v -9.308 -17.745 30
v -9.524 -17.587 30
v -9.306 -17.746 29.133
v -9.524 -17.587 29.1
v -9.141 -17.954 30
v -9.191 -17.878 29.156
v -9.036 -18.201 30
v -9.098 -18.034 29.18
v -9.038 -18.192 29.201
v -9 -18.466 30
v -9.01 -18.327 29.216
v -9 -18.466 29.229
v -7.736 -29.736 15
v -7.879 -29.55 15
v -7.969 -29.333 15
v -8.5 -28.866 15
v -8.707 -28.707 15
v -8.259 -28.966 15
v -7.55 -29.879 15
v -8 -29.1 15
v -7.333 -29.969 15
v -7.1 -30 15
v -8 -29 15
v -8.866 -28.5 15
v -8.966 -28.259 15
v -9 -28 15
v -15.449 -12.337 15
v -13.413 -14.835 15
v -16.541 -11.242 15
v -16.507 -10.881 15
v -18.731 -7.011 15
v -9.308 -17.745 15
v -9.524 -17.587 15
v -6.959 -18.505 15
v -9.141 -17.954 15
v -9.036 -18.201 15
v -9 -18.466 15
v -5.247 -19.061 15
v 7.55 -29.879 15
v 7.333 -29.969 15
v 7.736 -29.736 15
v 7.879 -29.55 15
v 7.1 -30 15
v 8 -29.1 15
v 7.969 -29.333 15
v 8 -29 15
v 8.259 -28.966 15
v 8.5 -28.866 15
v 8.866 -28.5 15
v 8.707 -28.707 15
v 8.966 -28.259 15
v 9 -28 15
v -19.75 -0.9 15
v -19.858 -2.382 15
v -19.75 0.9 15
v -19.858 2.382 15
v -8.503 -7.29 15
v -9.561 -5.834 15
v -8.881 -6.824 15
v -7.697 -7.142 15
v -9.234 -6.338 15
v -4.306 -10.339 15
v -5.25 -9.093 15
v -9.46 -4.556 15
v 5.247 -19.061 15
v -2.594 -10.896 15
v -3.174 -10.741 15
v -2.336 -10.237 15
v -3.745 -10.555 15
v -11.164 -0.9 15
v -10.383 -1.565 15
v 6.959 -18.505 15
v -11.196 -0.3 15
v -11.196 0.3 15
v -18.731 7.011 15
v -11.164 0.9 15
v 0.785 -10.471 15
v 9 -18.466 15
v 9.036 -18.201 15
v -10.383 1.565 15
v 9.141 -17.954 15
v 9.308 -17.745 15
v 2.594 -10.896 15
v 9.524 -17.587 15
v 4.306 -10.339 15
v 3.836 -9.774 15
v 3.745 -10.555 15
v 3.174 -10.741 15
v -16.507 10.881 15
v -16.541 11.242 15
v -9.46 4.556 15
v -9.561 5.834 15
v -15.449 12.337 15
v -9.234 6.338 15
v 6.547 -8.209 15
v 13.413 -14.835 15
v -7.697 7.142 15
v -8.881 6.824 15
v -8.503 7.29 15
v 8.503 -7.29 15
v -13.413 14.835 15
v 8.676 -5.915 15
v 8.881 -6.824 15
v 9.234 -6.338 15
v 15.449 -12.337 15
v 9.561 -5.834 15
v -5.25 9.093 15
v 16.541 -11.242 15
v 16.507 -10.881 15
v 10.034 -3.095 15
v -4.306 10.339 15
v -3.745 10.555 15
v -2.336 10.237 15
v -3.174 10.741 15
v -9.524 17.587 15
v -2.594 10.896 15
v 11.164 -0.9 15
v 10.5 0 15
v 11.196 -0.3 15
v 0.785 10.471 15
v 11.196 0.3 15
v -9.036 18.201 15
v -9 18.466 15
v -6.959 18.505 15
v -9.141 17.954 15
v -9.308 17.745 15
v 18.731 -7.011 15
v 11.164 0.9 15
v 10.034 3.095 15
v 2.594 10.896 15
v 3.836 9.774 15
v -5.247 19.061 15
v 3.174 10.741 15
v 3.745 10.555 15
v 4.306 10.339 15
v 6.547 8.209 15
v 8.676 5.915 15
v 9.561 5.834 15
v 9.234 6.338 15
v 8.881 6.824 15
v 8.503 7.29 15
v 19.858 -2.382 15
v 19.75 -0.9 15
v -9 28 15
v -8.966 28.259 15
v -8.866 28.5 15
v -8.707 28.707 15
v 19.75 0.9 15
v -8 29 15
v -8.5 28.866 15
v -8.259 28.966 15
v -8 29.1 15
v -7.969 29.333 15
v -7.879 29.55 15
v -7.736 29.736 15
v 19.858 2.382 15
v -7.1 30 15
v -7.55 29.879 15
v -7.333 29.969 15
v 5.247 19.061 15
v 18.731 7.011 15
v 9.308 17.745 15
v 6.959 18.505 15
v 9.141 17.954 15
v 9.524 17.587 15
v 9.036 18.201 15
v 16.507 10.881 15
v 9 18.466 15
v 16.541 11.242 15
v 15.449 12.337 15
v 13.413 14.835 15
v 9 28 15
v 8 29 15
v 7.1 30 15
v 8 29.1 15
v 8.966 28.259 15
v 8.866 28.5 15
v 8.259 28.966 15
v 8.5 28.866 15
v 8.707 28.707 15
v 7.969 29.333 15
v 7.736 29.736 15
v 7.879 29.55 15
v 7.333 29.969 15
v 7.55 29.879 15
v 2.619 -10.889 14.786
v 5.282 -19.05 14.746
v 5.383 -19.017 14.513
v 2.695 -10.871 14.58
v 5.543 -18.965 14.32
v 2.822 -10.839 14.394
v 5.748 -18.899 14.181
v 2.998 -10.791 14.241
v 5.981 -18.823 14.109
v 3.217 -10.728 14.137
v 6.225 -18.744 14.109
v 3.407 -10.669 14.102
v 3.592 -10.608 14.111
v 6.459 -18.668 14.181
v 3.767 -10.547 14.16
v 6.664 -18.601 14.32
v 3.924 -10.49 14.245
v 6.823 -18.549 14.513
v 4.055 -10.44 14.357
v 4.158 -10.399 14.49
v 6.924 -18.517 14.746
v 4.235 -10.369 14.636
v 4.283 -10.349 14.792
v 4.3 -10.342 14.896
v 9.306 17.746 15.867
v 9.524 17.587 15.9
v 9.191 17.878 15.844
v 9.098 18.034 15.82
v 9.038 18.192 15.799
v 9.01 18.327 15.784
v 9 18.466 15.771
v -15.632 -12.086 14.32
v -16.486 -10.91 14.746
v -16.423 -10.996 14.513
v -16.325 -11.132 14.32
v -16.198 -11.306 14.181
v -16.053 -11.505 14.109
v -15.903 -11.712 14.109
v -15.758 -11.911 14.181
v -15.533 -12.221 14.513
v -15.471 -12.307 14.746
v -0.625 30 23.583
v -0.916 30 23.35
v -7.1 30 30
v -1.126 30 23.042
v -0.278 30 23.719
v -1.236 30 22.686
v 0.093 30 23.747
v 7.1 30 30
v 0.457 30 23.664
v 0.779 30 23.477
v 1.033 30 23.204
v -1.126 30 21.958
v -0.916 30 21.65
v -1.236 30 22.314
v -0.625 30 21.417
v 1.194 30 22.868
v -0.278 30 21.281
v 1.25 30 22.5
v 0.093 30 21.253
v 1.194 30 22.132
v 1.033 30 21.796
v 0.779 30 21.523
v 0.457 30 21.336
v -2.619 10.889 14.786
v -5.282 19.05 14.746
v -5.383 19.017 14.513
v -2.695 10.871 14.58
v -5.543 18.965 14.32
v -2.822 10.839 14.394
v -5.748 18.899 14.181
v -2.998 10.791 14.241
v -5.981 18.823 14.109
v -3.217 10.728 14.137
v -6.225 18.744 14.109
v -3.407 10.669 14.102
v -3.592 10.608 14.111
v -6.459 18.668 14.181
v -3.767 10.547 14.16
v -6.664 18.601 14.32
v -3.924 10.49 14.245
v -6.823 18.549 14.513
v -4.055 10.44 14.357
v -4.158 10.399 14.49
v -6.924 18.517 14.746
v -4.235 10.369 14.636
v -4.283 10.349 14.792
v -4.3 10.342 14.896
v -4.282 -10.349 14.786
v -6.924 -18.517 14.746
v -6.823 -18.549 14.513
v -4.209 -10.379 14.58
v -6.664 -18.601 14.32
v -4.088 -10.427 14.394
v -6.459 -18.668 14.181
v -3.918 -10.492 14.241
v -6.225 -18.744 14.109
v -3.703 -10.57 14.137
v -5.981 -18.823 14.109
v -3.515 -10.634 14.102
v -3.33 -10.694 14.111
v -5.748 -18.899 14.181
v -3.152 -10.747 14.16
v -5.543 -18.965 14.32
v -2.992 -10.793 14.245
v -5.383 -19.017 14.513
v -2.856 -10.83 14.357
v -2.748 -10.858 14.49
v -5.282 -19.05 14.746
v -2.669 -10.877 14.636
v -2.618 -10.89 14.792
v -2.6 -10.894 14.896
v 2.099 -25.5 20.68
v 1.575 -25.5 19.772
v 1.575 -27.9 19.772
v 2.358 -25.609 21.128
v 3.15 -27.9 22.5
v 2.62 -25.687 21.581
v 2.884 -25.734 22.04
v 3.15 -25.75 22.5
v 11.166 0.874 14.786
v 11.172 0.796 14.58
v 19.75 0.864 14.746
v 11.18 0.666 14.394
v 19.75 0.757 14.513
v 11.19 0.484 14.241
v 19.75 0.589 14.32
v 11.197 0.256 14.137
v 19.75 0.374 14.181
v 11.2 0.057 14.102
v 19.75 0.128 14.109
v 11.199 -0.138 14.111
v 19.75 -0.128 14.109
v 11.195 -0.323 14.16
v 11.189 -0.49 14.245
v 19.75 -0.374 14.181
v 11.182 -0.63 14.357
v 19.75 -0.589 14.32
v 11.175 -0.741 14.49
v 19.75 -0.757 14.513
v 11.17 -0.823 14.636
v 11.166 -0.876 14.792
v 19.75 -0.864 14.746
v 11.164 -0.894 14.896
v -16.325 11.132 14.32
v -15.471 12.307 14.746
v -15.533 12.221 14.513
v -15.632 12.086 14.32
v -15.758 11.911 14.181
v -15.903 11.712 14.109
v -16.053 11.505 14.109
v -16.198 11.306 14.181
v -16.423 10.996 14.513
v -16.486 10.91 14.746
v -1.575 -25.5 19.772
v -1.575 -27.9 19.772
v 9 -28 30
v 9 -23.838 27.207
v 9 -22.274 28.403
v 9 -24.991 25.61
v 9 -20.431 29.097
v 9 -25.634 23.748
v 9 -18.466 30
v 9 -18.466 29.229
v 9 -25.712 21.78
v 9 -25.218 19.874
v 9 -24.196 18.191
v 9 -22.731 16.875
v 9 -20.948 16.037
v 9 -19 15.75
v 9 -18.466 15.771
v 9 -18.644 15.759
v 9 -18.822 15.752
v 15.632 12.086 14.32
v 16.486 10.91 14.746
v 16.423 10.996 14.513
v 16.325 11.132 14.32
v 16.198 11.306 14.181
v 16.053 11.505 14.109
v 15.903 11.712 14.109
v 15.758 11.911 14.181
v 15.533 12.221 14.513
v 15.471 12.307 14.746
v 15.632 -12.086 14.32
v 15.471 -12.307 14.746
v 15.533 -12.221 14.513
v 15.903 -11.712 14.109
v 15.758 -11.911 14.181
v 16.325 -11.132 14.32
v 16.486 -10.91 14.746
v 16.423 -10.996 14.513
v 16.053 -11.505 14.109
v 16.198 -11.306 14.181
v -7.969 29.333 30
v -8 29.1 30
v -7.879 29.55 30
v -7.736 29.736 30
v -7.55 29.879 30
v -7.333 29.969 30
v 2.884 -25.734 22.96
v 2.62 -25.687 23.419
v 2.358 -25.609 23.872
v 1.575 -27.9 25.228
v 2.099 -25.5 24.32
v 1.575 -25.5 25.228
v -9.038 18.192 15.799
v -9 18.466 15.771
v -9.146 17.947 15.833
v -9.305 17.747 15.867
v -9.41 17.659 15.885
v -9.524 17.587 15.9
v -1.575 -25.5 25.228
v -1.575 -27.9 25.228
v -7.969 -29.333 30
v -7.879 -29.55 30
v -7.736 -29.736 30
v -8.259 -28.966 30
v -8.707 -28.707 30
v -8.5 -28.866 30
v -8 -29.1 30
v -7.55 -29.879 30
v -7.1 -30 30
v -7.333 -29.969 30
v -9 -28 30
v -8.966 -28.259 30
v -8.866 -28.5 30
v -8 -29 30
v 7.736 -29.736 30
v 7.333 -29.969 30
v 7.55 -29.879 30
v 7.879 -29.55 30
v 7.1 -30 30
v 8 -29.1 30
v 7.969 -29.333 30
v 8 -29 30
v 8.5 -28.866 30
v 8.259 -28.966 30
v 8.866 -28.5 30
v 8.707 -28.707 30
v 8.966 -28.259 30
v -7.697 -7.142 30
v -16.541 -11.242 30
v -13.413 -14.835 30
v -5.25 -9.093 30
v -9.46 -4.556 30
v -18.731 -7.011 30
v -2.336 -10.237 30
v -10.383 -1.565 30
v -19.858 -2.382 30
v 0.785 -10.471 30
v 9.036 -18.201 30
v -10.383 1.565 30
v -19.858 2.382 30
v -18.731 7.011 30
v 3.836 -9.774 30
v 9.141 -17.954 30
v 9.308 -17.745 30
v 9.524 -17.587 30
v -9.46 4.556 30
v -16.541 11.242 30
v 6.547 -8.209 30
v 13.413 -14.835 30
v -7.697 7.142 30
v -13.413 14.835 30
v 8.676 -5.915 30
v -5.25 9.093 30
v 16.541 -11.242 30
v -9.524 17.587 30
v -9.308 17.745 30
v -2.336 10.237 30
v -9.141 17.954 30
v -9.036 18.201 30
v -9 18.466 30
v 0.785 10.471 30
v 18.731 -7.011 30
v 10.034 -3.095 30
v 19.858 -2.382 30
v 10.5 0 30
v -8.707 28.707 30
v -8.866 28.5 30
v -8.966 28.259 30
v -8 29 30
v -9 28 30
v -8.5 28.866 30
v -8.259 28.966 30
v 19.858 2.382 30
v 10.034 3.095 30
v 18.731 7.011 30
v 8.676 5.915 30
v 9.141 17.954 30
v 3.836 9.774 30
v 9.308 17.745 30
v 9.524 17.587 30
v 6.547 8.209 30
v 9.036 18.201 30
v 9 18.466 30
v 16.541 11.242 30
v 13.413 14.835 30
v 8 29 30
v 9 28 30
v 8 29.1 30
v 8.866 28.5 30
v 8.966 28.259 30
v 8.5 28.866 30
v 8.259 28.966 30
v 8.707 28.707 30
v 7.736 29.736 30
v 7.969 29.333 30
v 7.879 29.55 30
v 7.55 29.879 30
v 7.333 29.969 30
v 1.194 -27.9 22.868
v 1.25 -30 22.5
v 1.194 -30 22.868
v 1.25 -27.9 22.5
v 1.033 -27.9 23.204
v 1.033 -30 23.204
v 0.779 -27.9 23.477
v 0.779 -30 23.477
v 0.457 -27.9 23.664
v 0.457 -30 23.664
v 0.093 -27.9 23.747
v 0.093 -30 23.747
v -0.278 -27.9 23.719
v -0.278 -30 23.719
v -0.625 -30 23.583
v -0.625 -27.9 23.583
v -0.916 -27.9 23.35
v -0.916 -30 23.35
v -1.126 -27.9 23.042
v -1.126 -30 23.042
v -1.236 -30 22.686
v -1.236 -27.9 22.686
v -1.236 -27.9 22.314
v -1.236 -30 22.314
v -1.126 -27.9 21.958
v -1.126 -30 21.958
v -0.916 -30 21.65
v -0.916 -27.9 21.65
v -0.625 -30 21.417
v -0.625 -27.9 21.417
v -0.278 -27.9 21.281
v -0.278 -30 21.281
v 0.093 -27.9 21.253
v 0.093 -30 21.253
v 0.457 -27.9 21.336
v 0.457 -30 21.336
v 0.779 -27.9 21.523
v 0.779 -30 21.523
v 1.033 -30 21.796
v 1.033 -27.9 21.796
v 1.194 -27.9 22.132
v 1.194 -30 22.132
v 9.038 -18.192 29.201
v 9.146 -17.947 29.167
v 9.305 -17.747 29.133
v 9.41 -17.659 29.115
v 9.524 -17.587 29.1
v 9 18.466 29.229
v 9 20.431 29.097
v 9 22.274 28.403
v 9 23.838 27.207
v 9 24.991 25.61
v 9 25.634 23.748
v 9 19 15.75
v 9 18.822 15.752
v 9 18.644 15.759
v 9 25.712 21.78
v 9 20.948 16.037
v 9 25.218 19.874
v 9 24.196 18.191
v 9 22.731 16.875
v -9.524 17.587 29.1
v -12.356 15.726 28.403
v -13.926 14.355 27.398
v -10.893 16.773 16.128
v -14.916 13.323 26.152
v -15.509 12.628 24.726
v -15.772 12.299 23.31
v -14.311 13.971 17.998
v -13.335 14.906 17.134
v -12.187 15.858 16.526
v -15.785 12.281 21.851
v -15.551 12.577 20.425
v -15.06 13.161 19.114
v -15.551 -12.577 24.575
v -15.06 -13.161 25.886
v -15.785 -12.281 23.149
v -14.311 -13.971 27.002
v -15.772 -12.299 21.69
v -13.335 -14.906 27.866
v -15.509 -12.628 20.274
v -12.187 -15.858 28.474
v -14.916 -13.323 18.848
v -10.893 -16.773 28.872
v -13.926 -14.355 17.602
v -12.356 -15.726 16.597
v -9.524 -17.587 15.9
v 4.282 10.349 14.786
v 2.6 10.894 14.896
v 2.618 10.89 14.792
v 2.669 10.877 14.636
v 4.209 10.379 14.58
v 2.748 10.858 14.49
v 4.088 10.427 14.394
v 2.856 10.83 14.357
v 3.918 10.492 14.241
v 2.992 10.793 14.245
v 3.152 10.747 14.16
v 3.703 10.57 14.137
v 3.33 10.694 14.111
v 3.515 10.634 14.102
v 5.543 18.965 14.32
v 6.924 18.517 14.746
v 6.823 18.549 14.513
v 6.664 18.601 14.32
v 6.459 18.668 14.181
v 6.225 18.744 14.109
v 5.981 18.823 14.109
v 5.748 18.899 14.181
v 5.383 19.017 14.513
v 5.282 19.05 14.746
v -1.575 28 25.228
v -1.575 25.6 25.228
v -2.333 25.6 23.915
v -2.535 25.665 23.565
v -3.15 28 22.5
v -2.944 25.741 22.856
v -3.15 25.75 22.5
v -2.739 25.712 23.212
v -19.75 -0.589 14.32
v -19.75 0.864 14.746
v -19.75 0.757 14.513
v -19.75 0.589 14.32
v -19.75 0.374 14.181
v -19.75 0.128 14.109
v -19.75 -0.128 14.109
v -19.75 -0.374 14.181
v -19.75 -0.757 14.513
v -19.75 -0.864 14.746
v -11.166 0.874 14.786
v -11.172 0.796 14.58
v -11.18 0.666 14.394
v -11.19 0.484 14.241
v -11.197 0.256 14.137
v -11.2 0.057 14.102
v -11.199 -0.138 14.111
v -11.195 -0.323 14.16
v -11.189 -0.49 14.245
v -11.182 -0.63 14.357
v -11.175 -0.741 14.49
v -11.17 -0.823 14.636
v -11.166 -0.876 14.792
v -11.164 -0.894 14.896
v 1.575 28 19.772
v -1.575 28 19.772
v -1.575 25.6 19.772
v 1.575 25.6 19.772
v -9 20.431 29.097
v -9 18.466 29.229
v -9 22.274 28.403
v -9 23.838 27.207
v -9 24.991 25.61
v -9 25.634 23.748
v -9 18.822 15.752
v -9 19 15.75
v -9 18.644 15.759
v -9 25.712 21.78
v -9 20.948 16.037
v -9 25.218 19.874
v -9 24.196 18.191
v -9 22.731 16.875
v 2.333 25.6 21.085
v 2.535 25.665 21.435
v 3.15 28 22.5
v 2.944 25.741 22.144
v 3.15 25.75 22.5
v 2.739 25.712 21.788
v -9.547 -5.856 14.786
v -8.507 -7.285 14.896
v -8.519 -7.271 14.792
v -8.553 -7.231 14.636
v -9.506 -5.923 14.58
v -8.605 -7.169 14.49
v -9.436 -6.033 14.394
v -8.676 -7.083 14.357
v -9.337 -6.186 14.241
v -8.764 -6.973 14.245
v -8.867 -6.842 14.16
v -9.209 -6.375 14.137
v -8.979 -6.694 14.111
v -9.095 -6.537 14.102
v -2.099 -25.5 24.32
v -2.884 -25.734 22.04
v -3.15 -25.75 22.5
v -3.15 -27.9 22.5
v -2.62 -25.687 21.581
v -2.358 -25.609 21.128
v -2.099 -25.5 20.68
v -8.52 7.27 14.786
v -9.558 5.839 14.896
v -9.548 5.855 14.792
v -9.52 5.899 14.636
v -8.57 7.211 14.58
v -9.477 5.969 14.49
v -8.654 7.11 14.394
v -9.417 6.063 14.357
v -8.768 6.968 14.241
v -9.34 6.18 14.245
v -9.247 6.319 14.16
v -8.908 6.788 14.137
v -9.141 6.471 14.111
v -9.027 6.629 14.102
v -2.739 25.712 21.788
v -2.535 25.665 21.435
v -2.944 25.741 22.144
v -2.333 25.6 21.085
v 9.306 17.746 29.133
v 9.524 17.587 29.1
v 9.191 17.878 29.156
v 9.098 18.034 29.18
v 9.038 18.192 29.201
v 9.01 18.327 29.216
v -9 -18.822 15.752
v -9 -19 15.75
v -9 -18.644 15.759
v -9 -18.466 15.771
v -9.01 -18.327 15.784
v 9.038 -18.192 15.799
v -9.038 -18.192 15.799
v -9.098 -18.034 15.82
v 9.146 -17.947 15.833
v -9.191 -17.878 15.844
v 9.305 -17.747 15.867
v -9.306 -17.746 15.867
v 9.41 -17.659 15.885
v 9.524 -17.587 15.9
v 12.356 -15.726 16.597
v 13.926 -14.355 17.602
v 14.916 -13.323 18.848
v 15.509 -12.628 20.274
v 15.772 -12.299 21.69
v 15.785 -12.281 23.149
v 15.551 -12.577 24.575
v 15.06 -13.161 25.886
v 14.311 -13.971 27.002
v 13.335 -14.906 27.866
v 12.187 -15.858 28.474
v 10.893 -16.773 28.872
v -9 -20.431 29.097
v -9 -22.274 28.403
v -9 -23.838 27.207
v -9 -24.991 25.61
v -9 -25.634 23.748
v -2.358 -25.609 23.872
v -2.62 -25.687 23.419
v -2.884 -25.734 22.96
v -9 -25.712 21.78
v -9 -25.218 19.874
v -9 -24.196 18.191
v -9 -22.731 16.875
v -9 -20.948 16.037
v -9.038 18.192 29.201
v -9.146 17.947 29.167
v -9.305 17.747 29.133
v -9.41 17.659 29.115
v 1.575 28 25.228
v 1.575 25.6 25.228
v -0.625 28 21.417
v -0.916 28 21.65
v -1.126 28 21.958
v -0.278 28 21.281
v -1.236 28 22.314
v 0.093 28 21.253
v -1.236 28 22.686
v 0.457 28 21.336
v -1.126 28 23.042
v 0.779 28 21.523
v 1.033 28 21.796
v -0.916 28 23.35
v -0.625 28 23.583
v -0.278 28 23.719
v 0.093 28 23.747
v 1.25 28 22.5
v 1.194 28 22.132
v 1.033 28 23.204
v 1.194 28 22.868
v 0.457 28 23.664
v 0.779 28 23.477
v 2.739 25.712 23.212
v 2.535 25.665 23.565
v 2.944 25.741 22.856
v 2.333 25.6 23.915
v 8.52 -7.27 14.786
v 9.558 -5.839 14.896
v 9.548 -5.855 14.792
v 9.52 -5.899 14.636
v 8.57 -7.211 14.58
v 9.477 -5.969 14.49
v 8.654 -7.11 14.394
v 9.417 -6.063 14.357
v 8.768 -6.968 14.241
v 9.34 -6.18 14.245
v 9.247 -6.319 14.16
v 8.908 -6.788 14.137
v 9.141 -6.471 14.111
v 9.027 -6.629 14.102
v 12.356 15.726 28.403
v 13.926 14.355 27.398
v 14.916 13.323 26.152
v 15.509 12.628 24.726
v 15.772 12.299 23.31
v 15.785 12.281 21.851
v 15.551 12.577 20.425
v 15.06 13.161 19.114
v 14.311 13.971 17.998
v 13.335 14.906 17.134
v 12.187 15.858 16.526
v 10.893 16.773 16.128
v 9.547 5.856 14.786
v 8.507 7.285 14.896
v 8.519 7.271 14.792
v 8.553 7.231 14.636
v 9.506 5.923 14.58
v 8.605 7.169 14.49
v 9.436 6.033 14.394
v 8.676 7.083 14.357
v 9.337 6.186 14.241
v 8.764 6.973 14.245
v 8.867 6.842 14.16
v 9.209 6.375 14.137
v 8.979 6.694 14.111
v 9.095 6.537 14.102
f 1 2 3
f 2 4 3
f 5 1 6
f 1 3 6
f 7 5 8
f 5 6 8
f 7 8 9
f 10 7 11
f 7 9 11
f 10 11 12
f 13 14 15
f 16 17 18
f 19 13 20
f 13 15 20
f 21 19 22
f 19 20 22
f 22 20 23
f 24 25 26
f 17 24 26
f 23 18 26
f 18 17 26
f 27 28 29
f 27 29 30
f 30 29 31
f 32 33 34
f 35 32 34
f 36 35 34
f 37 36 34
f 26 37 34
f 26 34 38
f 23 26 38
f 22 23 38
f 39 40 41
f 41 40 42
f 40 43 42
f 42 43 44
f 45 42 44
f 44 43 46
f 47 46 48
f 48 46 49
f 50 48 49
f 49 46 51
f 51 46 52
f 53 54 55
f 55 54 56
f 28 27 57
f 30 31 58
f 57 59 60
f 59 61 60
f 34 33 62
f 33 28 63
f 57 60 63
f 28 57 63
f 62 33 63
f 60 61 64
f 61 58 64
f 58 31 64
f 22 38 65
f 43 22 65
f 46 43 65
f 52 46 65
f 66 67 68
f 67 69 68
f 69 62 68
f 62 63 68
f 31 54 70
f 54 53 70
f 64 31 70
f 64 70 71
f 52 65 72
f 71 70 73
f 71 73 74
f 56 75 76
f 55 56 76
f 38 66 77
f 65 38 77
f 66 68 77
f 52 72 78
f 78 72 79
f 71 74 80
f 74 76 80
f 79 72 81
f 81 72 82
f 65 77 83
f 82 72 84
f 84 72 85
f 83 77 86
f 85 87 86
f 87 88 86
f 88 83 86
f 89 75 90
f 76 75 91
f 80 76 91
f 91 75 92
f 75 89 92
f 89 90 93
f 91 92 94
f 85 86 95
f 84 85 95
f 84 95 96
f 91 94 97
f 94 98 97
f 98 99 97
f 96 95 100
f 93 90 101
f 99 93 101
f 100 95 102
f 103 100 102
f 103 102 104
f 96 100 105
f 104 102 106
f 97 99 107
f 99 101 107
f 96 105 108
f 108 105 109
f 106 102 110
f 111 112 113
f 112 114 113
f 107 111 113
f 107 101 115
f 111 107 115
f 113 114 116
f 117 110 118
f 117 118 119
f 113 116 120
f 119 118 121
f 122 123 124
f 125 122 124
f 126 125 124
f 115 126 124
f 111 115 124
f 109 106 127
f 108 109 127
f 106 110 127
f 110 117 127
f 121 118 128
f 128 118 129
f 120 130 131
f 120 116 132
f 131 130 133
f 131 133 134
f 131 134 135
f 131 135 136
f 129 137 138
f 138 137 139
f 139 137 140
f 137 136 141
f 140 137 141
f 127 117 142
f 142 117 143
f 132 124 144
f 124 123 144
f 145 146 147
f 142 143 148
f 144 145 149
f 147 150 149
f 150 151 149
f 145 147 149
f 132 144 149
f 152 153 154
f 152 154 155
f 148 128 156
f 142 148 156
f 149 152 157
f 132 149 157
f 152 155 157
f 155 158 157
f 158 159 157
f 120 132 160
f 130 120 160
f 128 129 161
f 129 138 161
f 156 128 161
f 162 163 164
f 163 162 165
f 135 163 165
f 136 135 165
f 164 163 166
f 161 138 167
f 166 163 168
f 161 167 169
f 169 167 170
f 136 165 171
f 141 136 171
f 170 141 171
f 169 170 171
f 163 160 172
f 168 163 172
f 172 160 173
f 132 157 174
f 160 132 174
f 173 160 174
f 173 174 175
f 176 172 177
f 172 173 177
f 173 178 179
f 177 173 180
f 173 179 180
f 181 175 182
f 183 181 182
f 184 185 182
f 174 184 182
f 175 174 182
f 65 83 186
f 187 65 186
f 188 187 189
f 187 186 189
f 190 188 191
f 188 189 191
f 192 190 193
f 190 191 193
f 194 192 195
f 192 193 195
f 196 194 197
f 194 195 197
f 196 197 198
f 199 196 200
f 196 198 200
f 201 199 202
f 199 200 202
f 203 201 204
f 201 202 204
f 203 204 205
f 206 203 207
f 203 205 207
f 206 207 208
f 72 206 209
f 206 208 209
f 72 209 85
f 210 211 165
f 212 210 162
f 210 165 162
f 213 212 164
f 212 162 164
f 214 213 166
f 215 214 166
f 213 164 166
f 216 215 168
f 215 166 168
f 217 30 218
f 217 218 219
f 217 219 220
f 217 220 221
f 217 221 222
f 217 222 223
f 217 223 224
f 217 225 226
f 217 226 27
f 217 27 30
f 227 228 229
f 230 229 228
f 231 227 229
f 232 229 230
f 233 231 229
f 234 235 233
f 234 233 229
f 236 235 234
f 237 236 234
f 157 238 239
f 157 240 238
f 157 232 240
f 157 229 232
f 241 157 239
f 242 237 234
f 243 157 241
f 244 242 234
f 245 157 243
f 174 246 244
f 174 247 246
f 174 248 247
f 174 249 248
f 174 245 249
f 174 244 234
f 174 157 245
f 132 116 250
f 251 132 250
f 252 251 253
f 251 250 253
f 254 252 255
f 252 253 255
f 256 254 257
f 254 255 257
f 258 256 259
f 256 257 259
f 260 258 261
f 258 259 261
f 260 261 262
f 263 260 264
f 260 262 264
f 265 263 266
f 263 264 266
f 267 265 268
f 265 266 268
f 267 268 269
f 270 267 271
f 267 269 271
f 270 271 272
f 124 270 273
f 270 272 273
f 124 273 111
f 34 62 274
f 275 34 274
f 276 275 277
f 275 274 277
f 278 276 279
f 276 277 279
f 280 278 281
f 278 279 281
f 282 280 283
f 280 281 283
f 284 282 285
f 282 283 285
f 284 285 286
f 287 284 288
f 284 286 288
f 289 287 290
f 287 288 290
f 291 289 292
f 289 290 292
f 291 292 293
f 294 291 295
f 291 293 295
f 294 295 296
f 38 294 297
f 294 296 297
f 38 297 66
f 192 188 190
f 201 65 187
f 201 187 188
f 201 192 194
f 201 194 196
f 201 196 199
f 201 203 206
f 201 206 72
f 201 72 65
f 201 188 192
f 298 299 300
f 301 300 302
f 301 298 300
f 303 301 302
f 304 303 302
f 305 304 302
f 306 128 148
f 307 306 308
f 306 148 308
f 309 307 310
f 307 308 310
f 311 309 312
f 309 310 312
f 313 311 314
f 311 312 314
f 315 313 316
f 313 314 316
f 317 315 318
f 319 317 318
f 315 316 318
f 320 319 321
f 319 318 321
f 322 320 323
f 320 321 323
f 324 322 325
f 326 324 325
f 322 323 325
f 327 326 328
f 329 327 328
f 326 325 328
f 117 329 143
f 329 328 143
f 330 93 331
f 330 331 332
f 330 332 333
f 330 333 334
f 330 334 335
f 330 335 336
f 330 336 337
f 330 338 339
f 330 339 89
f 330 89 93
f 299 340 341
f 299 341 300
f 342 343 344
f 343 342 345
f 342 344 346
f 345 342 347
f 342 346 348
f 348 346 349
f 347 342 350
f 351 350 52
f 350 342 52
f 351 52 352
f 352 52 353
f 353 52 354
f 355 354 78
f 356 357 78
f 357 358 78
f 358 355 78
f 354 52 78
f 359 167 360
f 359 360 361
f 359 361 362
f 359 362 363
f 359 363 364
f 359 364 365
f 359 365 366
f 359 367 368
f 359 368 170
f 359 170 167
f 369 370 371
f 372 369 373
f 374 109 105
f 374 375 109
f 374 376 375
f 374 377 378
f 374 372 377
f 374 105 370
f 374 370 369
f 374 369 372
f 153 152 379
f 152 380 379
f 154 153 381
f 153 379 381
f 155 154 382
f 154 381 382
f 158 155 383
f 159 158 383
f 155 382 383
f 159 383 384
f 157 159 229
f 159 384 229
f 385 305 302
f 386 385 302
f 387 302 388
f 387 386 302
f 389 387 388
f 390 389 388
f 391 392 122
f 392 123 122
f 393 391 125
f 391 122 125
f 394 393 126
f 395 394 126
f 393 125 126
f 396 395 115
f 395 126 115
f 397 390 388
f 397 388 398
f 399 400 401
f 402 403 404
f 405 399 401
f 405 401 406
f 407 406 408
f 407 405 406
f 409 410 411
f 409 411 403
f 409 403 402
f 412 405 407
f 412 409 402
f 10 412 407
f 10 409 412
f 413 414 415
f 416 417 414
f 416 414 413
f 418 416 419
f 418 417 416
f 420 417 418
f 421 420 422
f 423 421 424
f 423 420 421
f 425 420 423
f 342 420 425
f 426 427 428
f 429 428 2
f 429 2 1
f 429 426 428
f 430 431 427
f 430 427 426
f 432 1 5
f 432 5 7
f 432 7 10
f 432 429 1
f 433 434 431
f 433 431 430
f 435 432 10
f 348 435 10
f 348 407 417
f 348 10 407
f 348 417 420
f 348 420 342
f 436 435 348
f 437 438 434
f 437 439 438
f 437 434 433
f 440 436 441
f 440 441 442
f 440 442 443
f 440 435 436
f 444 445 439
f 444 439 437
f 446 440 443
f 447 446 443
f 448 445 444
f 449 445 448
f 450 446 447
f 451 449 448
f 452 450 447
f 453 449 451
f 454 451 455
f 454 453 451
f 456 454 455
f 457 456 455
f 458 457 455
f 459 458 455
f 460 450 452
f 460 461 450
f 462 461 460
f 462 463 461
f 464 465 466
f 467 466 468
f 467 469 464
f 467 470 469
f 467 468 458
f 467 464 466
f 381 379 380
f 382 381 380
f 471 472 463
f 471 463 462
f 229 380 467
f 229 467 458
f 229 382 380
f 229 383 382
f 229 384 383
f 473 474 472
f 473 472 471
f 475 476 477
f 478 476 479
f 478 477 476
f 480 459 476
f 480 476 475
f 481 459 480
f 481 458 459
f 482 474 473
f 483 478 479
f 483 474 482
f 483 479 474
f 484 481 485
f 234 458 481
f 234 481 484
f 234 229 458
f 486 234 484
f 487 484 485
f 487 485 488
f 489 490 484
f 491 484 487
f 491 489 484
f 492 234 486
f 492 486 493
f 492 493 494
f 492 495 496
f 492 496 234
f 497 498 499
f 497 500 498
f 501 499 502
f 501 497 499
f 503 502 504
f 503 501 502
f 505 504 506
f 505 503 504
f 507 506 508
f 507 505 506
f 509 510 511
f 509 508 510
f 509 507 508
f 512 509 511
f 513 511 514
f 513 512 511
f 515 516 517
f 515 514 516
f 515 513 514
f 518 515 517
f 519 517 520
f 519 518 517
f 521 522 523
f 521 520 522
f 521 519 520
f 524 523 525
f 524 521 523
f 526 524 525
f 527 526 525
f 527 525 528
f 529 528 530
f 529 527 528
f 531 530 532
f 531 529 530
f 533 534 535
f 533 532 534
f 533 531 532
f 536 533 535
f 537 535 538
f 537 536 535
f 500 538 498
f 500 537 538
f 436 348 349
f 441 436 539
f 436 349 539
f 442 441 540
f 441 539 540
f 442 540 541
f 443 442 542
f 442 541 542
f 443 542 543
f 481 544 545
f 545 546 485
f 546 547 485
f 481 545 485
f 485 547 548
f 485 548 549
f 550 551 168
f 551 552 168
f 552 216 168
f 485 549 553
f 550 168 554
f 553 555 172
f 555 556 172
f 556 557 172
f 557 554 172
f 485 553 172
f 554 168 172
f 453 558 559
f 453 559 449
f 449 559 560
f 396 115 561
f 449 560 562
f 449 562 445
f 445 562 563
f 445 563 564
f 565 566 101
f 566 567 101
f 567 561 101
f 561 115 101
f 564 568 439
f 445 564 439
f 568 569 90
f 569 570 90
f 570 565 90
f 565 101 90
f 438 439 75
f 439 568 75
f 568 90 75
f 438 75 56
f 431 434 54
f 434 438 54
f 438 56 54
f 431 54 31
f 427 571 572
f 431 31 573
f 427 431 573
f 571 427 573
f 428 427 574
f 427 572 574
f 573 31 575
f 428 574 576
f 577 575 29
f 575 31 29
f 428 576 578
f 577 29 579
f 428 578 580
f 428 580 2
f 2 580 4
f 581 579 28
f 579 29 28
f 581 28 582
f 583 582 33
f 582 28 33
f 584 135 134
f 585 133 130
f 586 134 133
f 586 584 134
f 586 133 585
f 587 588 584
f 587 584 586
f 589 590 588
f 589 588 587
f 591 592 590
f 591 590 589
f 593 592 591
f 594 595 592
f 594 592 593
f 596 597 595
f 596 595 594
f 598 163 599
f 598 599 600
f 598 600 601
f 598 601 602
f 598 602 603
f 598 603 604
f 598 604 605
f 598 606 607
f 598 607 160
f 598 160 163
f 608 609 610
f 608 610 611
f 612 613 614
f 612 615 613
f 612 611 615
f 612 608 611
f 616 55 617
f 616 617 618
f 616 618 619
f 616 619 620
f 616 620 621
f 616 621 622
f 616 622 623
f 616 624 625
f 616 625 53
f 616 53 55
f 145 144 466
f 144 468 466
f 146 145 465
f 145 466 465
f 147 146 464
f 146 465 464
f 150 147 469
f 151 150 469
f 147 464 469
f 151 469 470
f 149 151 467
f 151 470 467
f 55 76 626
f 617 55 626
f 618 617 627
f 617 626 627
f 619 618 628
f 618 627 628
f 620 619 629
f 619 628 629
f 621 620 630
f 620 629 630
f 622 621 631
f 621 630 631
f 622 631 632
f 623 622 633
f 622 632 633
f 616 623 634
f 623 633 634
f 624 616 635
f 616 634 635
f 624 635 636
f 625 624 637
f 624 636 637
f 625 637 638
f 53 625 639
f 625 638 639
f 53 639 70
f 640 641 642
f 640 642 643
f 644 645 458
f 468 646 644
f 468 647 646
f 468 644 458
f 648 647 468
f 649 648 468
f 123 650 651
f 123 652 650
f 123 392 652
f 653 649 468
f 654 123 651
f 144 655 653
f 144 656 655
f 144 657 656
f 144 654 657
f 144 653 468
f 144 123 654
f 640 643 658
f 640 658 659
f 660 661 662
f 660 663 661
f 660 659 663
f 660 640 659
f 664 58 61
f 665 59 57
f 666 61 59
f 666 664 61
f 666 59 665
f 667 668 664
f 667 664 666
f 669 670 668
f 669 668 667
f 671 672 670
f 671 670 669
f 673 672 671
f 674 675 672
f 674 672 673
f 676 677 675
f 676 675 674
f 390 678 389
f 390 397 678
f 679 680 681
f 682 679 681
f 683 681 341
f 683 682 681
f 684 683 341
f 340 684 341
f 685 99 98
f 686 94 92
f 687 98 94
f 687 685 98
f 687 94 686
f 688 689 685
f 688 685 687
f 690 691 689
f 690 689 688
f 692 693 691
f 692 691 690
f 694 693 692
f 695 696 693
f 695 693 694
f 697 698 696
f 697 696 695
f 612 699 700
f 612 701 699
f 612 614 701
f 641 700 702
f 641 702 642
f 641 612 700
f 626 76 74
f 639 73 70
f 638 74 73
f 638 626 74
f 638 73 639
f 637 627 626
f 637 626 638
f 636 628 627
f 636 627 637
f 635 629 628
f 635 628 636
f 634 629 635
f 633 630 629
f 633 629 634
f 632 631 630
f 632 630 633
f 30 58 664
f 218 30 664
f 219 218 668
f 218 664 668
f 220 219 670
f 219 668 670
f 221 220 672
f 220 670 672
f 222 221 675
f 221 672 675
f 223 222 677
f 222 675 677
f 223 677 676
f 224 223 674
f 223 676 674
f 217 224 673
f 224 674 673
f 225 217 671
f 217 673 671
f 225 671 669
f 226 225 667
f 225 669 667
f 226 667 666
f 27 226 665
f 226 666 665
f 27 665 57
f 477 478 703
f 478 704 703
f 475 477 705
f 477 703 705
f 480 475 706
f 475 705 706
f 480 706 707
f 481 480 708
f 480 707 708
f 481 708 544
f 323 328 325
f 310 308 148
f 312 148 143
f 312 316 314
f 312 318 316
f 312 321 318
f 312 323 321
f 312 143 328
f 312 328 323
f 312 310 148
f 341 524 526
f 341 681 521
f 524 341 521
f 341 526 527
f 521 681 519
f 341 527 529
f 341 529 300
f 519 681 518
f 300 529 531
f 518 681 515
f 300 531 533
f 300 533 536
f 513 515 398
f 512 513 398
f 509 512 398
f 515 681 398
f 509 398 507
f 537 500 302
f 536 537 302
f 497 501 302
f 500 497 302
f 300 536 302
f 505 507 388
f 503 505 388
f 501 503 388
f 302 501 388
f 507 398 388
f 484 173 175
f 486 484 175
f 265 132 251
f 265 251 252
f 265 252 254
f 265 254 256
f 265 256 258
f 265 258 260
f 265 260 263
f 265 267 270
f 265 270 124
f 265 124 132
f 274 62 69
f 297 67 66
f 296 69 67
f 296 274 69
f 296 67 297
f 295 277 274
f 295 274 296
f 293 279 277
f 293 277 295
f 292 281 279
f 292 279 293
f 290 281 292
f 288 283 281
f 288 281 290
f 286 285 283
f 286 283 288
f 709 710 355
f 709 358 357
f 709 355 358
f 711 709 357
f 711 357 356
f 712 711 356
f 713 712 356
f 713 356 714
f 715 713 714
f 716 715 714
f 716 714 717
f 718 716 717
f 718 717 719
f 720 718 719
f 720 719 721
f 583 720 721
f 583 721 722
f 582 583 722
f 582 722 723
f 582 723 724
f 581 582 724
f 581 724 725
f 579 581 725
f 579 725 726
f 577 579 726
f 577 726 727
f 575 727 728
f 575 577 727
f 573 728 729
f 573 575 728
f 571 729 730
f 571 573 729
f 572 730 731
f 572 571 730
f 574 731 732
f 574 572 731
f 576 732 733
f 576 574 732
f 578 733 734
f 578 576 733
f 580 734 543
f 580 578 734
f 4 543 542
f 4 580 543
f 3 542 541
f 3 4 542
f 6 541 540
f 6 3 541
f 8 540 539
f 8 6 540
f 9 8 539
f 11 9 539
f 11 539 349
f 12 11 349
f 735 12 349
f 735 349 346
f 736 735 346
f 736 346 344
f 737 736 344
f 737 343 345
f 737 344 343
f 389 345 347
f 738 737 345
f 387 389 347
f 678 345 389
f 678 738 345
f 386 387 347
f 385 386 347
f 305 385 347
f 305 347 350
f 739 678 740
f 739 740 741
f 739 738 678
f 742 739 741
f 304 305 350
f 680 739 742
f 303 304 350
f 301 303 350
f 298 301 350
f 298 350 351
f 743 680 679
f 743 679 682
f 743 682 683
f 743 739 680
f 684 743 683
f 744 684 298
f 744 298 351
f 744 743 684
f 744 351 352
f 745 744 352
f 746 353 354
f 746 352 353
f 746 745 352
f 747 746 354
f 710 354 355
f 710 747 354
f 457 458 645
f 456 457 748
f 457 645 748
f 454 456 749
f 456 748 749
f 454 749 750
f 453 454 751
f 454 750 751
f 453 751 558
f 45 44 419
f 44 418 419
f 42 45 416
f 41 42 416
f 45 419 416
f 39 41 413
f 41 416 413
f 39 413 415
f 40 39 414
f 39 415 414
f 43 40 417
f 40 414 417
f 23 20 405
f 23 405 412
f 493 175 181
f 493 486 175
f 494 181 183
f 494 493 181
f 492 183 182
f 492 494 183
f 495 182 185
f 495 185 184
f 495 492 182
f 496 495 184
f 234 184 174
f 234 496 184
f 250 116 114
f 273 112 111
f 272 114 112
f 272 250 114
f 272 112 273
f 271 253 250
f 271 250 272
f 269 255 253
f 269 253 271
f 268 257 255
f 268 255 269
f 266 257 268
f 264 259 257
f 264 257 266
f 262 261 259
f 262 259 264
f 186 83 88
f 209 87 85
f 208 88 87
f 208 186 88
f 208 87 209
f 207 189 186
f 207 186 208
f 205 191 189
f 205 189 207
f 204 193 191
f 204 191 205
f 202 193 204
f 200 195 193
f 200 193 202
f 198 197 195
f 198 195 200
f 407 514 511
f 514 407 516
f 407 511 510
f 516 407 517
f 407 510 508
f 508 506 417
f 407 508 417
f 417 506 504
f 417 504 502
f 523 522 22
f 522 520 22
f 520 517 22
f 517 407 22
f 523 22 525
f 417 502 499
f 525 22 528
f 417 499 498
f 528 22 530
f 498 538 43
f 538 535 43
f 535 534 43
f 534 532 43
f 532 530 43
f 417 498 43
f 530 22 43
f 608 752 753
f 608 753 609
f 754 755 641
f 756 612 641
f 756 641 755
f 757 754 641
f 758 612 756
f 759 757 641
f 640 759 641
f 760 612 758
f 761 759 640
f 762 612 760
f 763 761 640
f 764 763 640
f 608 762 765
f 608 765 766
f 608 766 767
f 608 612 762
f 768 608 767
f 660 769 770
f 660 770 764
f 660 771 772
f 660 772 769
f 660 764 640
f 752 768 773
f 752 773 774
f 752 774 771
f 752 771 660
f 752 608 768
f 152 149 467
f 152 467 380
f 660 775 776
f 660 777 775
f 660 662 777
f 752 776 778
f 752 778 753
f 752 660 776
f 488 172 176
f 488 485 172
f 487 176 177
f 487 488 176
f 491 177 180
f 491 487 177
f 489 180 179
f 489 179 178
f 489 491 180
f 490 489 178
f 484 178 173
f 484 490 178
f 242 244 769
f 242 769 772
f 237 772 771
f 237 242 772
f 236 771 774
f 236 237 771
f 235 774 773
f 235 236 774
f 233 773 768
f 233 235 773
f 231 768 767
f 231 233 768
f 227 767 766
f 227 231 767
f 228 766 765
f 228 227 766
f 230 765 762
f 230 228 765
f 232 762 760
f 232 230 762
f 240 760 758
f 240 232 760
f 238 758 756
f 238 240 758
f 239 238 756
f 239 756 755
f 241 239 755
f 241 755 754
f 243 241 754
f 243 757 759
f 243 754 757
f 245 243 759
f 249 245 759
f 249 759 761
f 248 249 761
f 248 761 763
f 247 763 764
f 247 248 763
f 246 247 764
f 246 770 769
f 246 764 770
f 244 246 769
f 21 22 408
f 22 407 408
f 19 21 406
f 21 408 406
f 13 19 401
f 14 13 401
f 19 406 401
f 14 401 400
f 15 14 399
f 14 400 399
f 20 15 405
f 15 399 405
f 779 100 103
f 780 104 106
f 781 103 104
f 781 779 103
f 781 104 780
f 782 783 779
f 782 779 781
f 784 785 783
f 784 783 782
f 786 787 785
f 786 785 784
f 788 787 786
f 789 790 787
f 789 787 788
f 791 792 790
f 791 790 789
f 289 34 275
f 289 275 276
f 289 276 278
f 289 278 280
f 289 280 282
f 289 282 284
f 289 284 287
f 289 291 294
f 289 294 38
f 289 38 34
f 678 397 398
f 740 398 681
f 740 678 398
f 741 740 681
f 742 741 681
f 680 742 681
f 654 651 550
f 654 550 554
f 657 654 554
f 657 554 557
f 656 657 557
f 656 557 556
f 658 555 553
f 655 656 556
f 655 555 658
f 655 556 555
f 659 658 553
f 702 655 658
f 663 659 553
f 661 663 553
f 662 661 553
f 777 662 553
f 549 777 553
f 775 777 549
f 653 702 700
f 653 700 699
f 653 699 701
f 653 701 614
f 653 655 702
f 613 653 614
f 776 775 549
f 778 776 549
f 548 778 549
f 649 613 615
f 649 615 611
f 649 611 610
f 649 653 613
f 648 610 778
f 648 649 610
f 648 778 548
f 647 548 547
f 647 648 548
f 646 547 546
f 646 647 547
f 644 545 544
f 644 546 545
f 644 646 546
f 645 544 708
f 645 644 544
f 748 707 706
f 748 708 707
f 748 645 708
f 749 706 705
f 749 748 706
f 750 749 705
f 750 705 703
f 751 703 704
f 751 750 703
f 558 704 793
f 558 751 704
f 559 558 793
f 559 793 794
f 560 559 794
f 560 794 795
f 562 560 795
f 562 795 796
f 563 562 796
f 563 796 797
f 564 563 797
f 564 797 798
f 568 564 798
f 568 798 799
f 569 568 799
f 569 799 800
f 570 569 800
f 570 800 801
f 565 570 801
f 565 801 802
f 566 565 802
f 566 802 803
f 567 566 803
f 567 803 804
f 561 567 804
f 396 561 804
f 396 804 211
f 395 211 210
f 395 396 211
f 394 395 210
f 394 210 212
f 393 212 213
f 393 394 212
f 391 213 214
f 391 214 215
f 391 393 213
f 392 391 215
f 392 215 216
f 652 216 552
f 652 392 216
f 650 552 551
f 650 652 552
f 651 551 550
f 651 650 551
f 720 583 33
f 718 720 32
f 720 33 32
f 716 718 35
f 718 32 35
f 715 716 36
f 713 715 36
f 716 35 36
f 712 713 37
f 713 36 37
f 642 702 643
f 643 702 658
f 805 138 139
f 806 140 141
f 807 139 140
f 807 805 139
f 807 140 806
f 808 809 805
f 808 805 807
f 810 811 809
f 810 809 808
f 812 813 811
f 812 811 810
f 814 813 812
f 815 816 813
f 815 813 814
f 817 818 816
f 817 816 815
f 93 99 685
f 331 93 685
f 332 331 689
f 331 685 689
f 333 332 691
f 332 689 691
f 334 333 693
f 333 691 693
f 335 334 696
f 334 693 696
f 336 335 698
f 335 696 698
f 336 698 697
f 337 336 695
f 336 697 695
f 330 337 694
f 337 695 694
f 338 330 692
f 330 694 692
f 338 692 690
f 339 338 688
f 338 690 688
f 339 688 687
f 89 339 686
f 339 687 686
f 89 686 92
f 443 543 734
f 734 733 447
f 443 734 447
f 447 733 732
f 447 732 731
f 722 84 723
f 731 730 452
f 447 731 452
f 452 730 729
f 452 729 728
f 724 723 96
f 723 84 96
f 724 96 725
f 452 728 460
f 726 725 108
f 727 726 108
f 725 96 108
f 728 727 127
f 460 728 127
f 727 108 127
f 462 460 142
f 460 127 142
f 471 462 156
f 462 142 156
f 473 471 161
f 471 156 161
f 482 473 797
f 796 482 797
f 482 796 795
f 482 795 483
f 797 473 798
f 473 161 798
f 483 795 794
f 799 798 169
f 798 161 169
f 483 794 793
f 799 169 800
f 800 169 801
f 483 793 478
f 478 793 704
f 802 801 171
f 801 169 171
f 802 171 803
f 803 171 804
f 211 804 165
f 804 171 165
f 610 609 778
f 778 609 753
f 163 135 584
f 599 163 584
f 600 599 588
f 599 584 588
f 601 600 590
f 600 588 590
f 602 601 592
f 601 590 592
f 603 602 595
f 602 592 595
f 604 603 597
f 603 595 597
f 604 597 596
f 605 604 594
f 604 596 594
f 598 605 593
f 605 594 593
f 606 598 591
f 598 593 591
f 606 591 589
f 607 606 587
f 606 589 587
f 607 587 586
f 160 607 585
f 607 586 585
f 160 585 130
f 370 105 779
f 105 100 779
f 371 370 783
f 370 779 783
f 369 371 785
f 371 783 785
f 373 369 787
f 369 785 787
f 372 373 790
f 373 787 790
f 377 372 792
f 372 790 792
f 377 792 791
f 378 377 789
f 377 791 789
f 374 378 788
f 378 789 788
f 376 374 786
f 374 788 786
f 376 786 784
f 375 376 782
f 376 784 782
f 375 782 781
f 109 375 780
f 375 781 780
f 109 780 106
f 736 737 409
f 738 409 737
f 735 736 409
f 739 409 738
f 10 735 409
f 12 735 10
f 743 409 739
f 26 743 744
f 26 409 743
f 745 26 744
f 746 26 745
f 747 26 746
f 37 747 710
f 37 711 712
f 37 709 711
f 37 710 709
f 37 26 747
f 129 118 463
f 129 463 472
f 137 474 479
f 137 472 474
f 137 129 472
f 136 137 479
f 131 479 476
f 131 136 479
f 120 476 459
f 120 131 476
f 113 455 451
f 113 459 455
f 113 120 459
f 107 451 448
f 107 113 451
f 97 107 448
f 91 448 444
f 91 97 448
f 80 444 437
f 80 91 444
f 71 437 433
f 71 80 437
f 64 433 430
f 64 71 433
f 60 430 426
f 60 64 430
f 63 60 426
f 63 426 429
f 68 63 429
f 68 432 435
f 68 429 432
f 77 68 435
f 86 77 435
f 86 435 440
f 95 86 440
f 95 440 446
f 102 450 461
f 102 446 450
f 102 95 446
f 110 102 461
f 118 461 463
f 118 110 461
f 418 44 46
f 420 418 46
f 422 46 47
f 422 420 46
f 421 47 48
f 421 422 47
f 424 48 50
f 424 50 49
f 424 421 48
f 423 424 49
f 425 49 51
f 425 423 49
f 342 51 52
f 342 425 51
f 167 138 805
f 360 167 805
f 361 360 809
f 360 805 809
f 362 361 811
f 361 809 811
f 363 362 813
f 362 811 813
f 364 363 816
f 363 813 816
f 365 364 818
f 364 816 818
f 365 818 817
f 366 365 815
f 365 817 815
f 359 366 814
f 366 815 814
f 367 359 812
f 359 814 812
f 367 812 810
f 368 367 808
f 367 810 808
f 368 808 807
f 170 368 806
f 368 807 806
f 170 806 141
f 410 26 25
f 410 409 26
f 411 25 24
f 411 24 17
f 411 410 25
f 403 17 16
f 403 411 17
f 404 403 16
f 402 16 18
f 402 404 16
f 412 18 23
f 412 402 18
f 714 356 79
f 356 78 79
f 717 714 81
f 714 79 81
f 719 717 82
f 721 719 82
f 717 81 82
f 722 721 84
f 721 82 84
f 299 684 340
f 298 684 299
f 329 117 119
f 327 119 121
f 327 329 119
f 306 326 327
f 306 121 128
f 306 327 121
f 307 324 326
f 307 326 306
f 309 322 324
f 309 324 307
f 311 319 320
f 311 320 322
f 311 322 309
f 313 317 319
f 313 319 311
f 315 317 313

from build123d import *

# Parameters (mm, degrees)
PRISM_DEPTH       = 2.4
PRISM001_DEPTH    = 2.4
CYLINDER012_R     = 1.25
CYLINDER012_DEPTH = 50
CYLINDER011_R     = 1.25
CYLINDER011_DEPTH = 50
CYLINDER007_R     = 6.75
CYLINDER007_DEPTH = 50
CYLINDER008_R     = 6.75
CYLINDER008_DEPTH = 50
BOX002_W          = 18
BOX002_H          = 18
BOX002_DEPTH      = 15
BOX003_W          = 18
BOX003_H          = 18
BOX003_DEPTH      = 15
CYLINDER004_R     = 11.2
CYLINDER004_DEPTH = 23
CYLINDER002_R     = 0.9
CYLINDER002_DEPTH = 19.75
ARRAY001_COUNT    = 10
CYLINDER006_R     = 10.5
CYLINDER006_DEPTH = 32
CYLINDER005_R     = 20
CYLINDER005_DEPTH = 15
FILLET003_R       = 1
CYLINDER029_R     = 1.25
CYLINDER029_DEPTH = 50
BOX009_W          = 16
BOX009_H          = 1
BOX009_DEPTH      = 15
CYLINDER030_R     = 1.25
CYLINDER030_DEPTH = 50
BOX010_W          = 16
BOX010_H          = 1
BOX010_DEPTH      = 15
FILLET010_R       = 0.9


with BuildPart() as prism:
    # Prism → Prism (new body)
    with BuildSketch(Plane(origin=(0, 28, 22.5), x_dir=(1, 0, 0), z_dir=(0, -1, 0))):
        Polygon((3.15, 0), (1.575, 2.72798), (-1.575, 2.72798), (-3.15, 0), (-1.575, -2.72798), (1.575, -2.72798), align=None)
    extrude(amount=PRISM_DEPTH)


with BuildPart() as prism001:
    # Prism001 → Prism001 (new body)
    with BuildSketch(Plane(origin=(0, -25.5, 22.5), x_dir=(1, 0, 0), z_dir=(0, -1, 0))):
        Polygon((3.15, 0), (1.575, 2.72798), (-1.575, 2.72798), (-3.15, 0), (-1.575, -2.72798), (1.575, -2.72798), align=None)
    extrude(amount=PRISM001_DEPTH)


with BuildPart() as cylinder011:
    # Cylinder012 → Cylinder012 (new body)
    with BuildSketch(Plane(origin=(0, 69, 22.5), x_dir=(1, 0, 0), z_dir=(0, -1, 0))):
        Circle(CYLINDER012_R)
    extrude(amount=CYLINDER012_DEPTH)


with BuildPart() as cylinder010:
    # Cylinder011 → Cylinder011 (new body)
    with BuildSketch(Plane(origin=(0, -16, 22.5), x_dir=(1, 0, 0), z_dir=(0, -1, 0))):
        Circle(CYLINDER011_R)
    extrude(amount=CYLINDER011_DEPTH)


with BuildPart() as cylinder007:
    # Cylinder007 → Cylinder007 (new body)
    with BuildSketch(Plane(origin=(-24, 19, 22.5), x_dir=(0, 0, -1), z_dir=(1, 0, 0))):
        Circle(CYLINDER007_R)
    extrude(amount=CYLINDER007_DEPTH)


with BuildPart() as cylinder008:
    # Cylinder008 → Cylinder008 (new body)
    with BuildSketch(Plane(origin=(-24, -19, 22.5), x_dir=(0, 0, -1), z_dir=(1, 0, 0))):
        Circle(CYLINDER008_R)
    extrude(amount=CYLINDER008_DEPTH)


with BuildPart() as cube002:
    # Box002 → Box002 (new body)
    with BuildSketch(Plane(origin=(-9, -29, 15), x_dir=(1, 0, 0), z_dir=(0, 0, 1))):
        with Locations((9, 9)):
            Rectangle(BOX002_W, BOX002_H)
    extrude(amount=BOX002_DEPTH)


with BuildPart() as cube003:
    # Box003 → Box003 (new body)
    with BuildSketch(Plane(origin=(-9, 11, 15), x_dir=(1, 0, 0), z_dir=(0, 0, 1))):
        with Locations((9, 9)):
            Rectangle(BOX003_W, BOX003_H)
    extrude(amount=BOX003_DEPTH)


with BuildPart() as cylinder004:
    # Cylinder004 → Cylinder004 (new body)
    with BuildSketch(Plane.XY):
        Circle(CYLINDER004_R)
    extrude(amount=CYLINDER004_DEPTH)


with BuildPart() as aspas:
    # Cylinder002 → Cylinder002 (new body)
    with BuildSketch(Plane(origin=(0, 0, 15), x_dir=(0, 0, -1), z_dir=(1, 0, 0))):
        Circle(CYLINDER002_R)
    extrude(amount=CYLINDER002_DEPTH)

    # Array001: aspas ×10 about axis
    array001_axis = Axis((0, 0, 0), (0, 0, 1))


with BuildPart() as aspas_1:
    add(aspas.part)
    for i in range(1, ARRAY001_COUNT):
        add(aspas.part.rotate(array001_axis, i * 360 / ARRAY001_COUNT))

    # Cut002: cut Cylinder004
    add(cylinder004.part, mode=Mode.SUBTRACT)


with BuildPart() as cylinder006:
    # Cylinder006 → Cylinder006 (new body)
    with BuildSketch(Plane.XY):
        Circle(CYLINDER006_R)
    extrude(amount=CYLINDER006_DEPTH)


with BuildPart() as final_soporte_inferior_estante11:
    # Cylinder005 → Cylinder005 (new body)
    with BuildSketch(Plane.XY.offset(15)):
        Circle(CYLINDER005_R)
    extrude(amount=CYLINDER005_DEPTH)

    # Cut004: cut Cylinder006
    add(cylinder006.part, mode=Mode.SUBTRACT)

    # Fusion001: union aspas
    add(aspas_1.part)

    # Fusion002: union Cube002, Cube003
    add(cube002.part)
    add(cube003.part)

    # Cut005: cut Cylinder008
    add(cylinder008.part, mode=Mode.SUBTRACT)

    # Cut006: cut Cylinder007
    add(cylinder007.part, mode=Mode.SUBTRACT)

    # Fillet003
    fillet003_edges = [final_soporte_inferior_estante11.edges().sort_by_distance(p)[0] for p in [
        (-9, -17.860571, 29.576567),
        (-9, -17.860571, 15.423433),
        (-9, -29, 22.5),
        (-9, 17.860571, 15.423433),
        (-9, 17.860571, 29.576567),
        (9, -29, 22.5),
        (9, -17.860571, 29.576567),
        (9, -17.860571, 15.423433),
        (9, 17.860571, 29.576567),
        (9, 17.860571, 15.423433),
        (9, 29, 22.5),
        (-9, 29, 22.5),
    ]]
    fillet(fillet003_edges, radius=FILLET003_R)

    # Cut008: cut Cylinder010
    add(cylinder010.part, mode=Mode.SUBTRACT)

    # Cut009: cut Cylinder011
    add(cylinder011.part, mode=Mode.SUBTRACT)

    # Cut025: cut Prism001
    add(prism001.part, mode=Mode.SUBTRACT)

    # Cut026: cut Prism
    add(prism.part, mode=Mode.SUBTRACT)


with BuildPart() as cylinder020:
    # Cylinder029 → Cylinder029 (new body)
    with BuildSketch(Plane(origin=(0, 69, 22.5), x_dir=(1, 0, 0), z_dir=(0, -1, 0))):
        Circle(CYLINDER029_R)
    extrude(amount=CYLINDER029_DEPTH)


with BuildPart() as cut027:
    # Box009 → Box009 (new body)
    with BuildSketch(Plane(origin=(-8, 29, 15), x_dir=(1, 0, 0), z_dir=(0, 0, 1))):
        with Locations((8, 0.5)):
            Rectangle(BOX009_W, BOX009_H)
    extrude(amount=BOX009_DEPTH)

    # Cut027: cut Cylinder020
    add(cylinder020.part, mode=Mode.SUBTRACT)


with BuildPart() as cylinder021:
    # Cylinder030 → Cylinder030 (new body)
    with BuildSketch(Plane(origin=(0, 69, 22.5), x_dir=(1, 0, 0), z_dir=(0, -1, 0))):
        Circle(CYLINDER030_R)
    extrude(amount=CYLINDER030_DEPTH)


with BuildPart() as final_soporte_inferior_estante1:
    # Box010 → Box010 (new body)
    with BuildSketch(Plane(origin=(-8, 29, 15), x_dir=(1, 0, 0), z_dir=(0, 0, 1))):
        with Locations((8, 0.5)):
            Rectangle(BOX010_W, BOX010_H)
    extrude(amount=BOX010_DEPTH)

    # Cut028: cut Cylinder021
    add(cylinder021.part, mode=Mode.SUBTRACT)


with BuildPart() as final_soporte_inferior_estante1_1:
    # Cut028 placement: moved
    add(final_soporte_inferior_estante1.part.moved(Location((0, -59, 0))))

    # Fusion008: union final_soporte_inferior_estante11, Cut027
    add(final_soporte_inferior_estante11.part)
    add(cut027.part)

    # Fillet010
    fillet010_edges = [final_soporte_inferior_estante1_1.edges().sort_by_distance(p)[0] for p in [
        (-8, -30, 22.5),
        (8, -30, 22.5),
        (-8, 30, 22.5),
        (8, 30, 22.5),
    ]]
    fillet(fillet010_edges, radius=FILLET010_R)


solid = final_soporte_inferior_estante1_1.part
